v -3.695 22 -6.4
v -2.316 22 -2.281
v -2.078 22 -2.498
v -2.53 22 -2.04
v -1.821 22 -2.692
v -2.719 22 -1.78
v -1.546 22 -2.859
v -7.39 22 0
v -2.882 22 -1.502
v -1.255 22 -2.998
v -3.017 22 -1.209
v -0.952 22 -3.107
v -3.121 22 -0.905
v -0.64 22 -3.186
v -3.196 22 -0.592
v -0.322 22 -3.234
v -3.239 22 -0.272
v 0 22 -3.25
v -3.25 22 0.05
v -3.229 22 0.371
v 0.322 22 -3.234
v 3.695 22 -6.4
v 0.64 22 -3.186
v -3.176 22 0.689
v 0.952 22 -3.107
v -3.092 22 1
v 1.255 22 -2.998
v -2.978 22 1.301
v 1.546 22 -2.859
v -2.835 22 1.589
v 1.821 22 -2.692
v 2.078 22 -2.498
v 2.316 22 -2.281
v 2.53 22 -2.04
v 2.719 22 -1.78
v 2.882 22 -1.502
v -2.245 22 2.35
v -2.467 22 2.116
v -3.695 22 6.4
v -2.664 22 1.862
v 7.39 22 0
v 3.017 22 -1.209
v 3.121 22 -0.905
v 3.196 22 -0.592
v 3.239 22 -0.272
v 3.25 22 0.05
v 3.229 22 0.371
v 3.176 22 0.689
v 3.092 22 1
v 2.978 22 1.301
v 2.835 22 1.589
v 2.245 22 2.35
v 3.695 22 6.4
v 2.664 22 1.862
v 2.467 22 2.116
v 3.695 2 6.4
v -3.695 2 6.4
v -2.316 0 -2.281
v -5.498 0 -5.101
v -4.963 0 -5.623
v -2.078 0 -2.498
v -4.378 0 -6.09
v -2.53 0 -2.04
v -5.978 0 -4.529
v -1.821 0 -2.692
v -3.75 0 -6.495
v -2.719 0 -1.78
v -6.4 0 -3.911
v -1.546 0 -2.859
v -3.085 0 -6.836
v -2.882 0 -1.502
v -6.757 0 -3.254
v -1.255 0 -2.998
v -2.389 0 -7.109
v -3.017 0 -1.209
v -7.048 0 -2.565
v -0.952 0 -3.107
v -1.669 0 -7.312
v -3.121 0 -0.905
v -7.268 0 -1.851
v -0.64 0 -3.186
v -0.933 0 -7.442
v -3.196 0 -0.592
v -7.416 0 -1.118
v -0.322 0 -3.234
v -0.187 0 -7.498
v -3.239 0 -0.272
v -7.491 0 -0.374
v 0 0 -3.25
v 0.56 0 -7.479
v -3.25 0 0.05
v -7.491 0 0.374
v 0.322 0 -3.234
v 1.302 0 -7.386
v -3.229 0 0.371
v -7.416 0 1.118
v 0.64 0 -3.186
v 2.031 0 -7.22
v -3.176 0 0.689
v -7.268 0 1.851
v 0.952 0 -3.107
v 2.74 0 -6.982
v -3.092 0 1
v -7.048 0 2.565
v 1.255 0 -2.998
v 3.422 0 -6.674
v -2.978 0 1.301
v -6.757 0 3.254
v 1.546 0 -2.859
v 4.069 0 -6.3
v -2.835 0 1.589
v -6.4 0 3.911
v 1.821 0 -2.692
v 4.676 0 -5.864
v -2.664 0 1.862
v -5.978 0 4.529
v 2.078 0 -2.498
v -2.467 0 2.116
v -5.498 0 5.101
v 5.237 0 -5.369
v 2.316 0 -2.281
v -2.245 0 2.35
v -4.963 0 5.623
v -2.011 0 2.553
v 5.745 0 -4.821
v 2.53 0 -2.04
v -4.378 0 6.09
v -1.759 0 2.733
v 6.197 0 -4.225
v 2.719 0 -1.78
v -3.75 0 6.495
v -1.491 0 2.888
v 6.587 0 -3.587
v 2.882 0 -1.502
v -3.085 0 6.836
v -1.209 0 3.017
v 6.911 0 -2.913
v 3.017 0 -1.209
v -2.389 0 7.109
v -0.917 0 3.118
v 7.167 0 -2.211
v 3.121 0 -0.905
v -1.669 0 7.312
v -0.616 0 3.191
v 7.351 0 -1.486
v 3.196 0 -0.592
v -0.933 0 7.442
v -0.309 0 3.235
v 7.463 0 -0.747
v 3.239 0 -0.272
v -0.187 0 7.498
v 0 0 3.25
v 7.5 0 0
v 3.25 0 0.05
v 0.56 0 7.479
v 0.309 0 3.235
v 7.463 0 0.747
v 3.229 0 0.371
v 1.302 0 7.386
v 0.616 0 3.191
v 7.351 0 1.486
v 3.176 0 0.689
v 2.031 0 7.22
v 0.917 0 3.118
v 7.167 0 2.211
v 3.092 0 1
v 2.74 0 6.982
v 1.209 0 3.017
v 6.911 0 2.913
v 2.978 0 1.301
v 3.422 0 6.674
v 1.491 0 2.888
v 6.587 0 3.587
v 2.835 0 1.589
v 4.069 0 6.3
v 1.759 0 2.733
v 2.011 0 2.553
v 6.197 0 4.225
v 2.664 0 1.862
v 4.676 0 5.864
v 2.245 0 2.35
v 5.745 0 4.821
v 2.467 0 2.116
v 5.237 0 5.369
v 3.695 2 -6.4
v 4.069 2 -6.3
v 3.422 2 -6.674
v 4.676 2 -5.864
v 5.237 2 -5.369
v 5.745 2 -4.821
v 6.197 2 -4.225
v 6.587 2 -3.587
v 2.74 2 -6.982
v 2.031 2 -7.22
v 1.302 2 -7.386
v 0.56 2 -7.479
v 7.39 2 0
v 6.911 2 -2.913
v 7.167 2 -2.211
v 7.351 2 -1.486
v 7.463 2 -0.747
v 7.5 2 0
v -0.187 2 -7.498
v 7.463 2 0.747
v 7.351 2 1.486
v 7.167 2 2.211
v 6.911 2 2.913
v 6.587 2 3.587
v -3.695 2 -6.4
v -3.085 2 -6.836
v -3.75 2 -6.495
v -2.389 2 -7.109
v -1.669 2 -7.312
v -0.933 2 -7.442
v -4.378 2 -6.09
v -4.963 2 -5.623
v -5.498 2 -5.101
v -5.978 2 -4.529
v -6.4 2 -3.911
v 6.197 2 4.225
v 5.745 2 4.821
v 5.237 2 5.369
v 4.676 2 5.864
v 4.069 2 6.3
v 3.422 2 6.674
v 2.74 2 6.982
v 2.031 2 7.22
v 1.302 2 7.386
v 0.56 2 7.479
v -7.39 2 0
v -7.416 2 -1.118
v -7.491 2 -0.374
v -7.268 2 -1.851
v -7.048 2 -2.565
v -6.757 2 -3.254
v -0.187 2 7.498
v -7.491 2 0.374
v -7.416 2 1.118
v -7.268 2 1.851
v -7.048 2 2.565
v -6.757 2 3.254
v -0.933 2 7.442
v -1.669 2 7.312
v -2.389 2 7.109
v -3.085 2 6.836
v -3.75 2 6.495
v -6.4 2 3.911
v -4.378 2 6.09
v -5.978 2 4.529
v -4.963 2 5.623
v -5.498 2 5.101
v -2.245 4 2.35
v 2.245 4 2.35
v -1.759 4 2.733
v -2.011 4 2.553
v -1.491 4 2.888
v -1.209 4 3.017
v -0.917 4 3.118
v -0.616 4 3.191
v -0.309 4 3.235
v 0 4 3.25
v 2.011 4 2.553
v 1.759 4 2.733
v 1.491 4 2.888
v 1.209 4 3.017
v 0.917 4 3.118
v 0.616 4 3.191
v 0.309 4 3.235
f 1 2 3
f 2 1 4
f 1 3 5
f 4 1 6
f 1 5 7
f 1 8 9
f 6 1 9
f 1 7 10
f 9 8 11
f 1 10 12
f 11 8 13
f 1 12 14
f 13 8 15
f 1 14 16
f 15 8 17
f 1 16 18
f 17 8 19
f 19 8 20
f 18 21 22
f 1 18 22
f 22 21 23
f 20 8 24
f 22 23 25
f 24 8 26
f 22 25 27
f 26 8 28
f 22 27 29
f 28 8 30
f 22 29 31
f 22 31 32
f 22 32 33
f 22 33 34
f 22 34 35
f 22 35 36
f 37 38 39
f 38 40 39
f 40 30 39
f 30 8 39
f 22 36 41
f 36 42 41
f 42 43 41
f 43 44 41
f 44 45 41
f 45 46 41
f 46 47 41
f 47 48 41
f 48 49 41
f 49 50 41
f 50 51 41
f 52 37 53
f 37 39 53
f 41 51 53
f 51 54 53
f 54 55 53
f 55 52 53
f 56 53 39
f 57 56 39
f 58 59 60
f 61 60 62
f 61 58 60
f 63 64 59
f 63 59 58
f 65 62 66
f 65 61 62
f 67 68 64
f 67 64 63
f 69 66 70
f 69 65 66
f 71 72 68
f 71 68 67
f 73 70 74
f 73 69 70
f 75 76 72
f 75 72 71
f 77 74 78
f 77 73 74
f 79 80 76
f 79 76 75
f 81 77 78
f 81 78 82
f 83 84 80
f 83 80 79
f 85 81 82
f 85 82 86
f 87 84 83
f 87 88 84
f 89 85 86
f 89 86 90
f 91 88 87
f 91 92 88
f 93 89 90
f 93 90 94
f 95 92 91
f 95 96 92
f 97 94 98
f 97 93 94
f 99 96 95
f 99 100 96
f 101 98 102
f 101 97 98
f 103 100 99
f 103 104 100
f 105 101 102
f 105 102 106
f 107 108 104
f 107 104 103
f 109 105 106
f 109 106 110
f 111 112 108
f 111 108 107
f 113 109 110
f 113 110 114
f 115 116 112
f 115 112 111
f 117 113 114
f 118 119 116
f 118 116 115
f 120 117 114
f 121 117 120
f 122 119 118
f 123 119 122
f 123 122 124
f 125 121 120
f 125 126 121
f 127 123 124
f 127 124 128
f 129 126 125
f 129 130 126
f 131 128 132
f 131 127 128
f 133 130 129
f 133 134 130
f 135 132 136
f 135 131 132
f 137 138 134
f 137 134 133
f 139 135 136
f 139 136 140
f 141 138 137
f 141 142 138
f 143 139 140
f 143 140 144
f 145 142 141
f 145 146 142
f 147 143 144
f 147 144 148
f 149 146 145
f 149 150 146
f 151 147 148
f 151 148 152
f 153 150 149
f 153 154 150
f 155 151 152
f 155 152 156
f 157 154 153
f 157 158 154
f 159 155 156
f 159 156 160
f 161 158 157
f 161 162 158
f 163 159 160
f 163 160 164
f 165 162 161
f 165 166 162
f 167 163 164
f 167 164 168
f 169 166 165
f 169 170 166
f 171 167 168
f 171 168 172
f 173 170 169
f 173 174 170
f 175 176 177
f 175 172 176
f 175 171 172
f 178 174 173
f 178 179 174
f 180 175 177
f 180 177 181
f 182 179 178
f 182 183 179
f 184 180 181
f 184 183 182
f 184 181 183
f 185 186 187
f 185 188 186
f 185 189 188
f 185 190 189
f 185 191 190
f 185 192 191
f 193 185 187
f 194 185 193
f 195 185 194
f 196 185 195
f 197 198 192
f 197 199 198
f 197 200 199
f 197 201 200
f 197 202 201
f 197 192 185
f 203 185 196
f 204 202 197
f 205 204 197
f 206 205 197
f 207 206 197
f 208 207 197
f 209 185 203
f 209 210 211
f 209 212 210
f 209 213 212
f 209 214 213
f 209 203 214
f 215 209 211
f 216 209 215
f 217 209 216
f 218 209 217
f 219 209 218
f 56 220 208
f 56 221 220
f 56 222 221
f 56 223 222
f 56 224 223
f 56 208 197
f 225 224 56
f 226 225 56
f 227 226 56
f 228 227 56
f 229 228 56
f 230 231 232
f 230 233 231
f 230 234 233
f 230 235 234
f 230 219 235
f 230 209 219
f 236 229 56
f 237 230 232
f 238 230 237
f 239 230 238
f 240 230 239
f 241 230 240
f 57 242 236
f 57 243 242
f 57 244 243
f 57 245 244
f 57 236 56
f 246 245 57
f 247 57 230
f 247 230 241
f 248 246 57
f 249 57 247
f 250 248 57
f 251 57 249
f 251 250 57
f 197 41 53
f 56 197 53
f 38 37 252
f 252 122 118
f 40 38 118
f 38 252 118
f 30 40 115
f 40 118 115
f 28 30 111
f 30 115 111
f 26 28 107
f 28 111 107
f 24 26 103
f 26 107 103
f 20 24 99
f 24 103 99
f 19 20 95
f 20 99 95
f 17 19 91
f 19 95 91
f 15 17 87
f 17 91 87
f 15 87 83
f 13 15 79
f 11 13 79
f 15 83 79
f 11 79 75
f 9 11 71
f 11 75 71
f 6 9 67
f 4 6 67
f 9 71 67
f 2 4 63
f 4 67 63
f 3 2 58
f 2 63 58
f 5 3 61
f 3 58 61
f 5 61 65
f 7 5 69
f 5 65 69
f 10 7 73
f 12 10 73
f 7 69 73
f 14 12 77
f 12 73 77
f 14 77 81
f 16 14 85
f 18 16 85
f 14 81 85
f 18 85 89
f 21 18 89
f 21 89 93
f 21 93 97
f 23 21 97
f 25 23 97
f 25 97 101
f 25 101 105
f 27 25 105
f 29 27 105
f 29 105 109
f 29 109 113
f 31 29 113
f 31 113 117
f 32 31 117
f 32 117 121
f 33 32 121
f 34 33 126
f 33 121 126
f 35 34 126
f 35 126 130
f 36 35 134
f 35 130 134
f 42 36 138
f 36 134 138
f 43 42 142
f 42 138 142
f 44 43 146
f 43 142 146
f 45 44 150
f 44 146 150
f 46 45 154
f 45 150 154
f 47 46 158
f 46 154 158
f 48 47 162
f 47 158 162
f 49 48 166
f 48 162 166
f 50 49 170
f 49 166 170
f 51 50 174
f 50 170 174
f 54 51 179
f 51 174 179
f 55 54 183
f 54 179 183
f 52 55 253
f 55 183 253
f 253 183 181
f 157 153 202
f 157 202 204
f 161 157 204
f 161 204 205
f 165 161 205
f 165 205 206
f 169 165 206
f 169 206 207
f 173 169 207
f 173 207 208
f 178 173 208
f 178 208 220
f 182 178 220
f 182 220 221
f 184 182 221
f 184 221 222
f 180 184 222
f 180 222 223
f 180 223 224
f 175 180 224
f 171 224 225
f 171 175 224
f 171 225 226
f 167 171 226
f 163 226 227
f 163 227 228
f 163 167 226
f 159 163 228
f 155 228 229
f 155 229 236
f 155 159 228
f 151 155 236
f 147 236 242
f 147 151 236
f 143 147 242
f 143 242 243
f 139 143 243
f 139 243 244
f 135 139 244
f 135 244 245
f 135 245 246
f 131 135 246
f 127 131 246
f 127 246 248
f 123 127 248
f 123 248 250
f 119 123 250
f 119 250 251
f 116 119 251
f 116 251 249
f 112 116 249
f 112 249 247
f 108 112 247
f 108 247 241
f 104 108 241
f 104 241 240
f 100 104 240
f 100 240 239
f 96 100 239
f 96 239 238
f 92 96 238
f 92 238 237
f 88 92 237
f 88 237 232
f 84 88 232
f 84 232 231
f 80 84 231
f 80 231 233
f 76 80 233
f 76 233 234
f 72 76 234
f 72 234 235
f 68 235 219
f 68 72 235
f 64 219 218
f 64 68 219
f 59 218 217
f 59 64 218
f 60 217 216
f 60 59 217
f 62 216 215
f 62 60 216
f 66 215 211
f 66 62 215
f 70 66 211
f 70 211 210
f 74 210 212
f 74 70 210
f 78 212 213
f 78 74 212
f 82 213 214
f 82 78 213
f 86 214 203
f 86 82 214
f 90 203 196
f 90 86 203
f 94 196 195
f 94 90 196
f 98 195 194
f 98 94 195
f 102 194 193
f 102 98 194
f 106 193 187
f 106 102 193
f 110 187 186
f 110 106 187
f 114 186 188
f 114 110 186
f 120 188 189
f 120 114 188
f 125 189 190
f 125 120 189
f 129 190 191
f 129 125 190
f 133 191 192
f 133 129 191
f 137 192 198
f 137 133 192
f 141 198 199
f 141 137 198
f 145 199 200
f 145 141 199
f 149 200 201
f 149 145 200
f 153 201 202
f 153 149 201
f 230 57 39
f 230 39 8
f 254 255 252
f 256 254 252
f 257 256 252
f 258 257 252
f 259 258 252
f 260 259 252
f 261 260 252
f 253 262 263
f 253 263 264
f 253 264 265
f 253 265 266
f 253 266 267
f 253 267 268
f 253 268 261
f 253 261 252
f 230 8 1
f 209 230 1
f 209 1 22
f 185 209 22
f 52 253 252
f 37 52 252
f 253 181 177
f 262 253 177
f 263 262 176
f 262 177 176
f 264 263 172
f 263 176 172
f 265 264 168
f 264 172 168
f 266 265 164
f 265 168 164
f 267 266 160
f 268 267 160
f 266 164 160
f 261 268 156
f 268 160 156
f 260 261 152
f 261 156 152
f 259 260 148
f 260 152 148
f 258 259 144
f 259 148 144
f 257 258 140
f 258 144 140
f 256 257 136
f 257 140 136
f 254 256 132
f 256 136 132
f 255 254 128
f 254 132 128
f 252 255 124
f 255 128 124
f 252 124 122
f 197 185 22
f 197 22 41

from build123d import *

# Parameters (mm, degrees)
F0_R     = 7.5
F1_DEPTH = 22
F2_R     = 8
F3_DEPTH = 20
F5_DEPTH = 22.001
F6_R     = 3.25
F7_DEPTH = 4


with BuildPart() as f1:
    # F0 (on Front) → F1 (new body)
    with BuildSketch(Plane.XZ):
        Circle(F0_R)
    extrude(amount=-F1_DEPTH)

    # F2 (on face) → F3 (cut)
    with BuildSketch(Plane(origin=(0, 22, 0), x_dir=(-1, 0, 0), z_dir=(0, 1, 0))):
        Circle(F2_R)
        Polygon((3.695042, 6.4), (7.390083, 0), (3.695042, -6.4), (-3.695042, -6.4), (-7.390083, 0), (-3.695042, 6.4), align=None, mode=Mode.SUBTRACT)
    extrude(amount=-F3_DEPTH, mode=Mode.SUBTRACT)

    # F4 (on face) → F5 (cut, through all)
    with BuildSketch(Plane.XZ):
        with BuildLine():
            Line((2.244994, 2.35), (-2.244994, 2.35))
            ThreePointArc((-2.244994, 2.35), (0, -3.25), (2.244994, 2.35))
        make_face()
    extrude(amount=-F5_DEPTH, mode=Mode.SUBTRACT)

    # F6 (on face) → F7 (cut)
    with BuildSketch(Plane.XZ):
        Circle(F6_R)
    extrude(amount=-F7_DEPTH, mode=Mode.SUBTRACT)


solid = f1.part
